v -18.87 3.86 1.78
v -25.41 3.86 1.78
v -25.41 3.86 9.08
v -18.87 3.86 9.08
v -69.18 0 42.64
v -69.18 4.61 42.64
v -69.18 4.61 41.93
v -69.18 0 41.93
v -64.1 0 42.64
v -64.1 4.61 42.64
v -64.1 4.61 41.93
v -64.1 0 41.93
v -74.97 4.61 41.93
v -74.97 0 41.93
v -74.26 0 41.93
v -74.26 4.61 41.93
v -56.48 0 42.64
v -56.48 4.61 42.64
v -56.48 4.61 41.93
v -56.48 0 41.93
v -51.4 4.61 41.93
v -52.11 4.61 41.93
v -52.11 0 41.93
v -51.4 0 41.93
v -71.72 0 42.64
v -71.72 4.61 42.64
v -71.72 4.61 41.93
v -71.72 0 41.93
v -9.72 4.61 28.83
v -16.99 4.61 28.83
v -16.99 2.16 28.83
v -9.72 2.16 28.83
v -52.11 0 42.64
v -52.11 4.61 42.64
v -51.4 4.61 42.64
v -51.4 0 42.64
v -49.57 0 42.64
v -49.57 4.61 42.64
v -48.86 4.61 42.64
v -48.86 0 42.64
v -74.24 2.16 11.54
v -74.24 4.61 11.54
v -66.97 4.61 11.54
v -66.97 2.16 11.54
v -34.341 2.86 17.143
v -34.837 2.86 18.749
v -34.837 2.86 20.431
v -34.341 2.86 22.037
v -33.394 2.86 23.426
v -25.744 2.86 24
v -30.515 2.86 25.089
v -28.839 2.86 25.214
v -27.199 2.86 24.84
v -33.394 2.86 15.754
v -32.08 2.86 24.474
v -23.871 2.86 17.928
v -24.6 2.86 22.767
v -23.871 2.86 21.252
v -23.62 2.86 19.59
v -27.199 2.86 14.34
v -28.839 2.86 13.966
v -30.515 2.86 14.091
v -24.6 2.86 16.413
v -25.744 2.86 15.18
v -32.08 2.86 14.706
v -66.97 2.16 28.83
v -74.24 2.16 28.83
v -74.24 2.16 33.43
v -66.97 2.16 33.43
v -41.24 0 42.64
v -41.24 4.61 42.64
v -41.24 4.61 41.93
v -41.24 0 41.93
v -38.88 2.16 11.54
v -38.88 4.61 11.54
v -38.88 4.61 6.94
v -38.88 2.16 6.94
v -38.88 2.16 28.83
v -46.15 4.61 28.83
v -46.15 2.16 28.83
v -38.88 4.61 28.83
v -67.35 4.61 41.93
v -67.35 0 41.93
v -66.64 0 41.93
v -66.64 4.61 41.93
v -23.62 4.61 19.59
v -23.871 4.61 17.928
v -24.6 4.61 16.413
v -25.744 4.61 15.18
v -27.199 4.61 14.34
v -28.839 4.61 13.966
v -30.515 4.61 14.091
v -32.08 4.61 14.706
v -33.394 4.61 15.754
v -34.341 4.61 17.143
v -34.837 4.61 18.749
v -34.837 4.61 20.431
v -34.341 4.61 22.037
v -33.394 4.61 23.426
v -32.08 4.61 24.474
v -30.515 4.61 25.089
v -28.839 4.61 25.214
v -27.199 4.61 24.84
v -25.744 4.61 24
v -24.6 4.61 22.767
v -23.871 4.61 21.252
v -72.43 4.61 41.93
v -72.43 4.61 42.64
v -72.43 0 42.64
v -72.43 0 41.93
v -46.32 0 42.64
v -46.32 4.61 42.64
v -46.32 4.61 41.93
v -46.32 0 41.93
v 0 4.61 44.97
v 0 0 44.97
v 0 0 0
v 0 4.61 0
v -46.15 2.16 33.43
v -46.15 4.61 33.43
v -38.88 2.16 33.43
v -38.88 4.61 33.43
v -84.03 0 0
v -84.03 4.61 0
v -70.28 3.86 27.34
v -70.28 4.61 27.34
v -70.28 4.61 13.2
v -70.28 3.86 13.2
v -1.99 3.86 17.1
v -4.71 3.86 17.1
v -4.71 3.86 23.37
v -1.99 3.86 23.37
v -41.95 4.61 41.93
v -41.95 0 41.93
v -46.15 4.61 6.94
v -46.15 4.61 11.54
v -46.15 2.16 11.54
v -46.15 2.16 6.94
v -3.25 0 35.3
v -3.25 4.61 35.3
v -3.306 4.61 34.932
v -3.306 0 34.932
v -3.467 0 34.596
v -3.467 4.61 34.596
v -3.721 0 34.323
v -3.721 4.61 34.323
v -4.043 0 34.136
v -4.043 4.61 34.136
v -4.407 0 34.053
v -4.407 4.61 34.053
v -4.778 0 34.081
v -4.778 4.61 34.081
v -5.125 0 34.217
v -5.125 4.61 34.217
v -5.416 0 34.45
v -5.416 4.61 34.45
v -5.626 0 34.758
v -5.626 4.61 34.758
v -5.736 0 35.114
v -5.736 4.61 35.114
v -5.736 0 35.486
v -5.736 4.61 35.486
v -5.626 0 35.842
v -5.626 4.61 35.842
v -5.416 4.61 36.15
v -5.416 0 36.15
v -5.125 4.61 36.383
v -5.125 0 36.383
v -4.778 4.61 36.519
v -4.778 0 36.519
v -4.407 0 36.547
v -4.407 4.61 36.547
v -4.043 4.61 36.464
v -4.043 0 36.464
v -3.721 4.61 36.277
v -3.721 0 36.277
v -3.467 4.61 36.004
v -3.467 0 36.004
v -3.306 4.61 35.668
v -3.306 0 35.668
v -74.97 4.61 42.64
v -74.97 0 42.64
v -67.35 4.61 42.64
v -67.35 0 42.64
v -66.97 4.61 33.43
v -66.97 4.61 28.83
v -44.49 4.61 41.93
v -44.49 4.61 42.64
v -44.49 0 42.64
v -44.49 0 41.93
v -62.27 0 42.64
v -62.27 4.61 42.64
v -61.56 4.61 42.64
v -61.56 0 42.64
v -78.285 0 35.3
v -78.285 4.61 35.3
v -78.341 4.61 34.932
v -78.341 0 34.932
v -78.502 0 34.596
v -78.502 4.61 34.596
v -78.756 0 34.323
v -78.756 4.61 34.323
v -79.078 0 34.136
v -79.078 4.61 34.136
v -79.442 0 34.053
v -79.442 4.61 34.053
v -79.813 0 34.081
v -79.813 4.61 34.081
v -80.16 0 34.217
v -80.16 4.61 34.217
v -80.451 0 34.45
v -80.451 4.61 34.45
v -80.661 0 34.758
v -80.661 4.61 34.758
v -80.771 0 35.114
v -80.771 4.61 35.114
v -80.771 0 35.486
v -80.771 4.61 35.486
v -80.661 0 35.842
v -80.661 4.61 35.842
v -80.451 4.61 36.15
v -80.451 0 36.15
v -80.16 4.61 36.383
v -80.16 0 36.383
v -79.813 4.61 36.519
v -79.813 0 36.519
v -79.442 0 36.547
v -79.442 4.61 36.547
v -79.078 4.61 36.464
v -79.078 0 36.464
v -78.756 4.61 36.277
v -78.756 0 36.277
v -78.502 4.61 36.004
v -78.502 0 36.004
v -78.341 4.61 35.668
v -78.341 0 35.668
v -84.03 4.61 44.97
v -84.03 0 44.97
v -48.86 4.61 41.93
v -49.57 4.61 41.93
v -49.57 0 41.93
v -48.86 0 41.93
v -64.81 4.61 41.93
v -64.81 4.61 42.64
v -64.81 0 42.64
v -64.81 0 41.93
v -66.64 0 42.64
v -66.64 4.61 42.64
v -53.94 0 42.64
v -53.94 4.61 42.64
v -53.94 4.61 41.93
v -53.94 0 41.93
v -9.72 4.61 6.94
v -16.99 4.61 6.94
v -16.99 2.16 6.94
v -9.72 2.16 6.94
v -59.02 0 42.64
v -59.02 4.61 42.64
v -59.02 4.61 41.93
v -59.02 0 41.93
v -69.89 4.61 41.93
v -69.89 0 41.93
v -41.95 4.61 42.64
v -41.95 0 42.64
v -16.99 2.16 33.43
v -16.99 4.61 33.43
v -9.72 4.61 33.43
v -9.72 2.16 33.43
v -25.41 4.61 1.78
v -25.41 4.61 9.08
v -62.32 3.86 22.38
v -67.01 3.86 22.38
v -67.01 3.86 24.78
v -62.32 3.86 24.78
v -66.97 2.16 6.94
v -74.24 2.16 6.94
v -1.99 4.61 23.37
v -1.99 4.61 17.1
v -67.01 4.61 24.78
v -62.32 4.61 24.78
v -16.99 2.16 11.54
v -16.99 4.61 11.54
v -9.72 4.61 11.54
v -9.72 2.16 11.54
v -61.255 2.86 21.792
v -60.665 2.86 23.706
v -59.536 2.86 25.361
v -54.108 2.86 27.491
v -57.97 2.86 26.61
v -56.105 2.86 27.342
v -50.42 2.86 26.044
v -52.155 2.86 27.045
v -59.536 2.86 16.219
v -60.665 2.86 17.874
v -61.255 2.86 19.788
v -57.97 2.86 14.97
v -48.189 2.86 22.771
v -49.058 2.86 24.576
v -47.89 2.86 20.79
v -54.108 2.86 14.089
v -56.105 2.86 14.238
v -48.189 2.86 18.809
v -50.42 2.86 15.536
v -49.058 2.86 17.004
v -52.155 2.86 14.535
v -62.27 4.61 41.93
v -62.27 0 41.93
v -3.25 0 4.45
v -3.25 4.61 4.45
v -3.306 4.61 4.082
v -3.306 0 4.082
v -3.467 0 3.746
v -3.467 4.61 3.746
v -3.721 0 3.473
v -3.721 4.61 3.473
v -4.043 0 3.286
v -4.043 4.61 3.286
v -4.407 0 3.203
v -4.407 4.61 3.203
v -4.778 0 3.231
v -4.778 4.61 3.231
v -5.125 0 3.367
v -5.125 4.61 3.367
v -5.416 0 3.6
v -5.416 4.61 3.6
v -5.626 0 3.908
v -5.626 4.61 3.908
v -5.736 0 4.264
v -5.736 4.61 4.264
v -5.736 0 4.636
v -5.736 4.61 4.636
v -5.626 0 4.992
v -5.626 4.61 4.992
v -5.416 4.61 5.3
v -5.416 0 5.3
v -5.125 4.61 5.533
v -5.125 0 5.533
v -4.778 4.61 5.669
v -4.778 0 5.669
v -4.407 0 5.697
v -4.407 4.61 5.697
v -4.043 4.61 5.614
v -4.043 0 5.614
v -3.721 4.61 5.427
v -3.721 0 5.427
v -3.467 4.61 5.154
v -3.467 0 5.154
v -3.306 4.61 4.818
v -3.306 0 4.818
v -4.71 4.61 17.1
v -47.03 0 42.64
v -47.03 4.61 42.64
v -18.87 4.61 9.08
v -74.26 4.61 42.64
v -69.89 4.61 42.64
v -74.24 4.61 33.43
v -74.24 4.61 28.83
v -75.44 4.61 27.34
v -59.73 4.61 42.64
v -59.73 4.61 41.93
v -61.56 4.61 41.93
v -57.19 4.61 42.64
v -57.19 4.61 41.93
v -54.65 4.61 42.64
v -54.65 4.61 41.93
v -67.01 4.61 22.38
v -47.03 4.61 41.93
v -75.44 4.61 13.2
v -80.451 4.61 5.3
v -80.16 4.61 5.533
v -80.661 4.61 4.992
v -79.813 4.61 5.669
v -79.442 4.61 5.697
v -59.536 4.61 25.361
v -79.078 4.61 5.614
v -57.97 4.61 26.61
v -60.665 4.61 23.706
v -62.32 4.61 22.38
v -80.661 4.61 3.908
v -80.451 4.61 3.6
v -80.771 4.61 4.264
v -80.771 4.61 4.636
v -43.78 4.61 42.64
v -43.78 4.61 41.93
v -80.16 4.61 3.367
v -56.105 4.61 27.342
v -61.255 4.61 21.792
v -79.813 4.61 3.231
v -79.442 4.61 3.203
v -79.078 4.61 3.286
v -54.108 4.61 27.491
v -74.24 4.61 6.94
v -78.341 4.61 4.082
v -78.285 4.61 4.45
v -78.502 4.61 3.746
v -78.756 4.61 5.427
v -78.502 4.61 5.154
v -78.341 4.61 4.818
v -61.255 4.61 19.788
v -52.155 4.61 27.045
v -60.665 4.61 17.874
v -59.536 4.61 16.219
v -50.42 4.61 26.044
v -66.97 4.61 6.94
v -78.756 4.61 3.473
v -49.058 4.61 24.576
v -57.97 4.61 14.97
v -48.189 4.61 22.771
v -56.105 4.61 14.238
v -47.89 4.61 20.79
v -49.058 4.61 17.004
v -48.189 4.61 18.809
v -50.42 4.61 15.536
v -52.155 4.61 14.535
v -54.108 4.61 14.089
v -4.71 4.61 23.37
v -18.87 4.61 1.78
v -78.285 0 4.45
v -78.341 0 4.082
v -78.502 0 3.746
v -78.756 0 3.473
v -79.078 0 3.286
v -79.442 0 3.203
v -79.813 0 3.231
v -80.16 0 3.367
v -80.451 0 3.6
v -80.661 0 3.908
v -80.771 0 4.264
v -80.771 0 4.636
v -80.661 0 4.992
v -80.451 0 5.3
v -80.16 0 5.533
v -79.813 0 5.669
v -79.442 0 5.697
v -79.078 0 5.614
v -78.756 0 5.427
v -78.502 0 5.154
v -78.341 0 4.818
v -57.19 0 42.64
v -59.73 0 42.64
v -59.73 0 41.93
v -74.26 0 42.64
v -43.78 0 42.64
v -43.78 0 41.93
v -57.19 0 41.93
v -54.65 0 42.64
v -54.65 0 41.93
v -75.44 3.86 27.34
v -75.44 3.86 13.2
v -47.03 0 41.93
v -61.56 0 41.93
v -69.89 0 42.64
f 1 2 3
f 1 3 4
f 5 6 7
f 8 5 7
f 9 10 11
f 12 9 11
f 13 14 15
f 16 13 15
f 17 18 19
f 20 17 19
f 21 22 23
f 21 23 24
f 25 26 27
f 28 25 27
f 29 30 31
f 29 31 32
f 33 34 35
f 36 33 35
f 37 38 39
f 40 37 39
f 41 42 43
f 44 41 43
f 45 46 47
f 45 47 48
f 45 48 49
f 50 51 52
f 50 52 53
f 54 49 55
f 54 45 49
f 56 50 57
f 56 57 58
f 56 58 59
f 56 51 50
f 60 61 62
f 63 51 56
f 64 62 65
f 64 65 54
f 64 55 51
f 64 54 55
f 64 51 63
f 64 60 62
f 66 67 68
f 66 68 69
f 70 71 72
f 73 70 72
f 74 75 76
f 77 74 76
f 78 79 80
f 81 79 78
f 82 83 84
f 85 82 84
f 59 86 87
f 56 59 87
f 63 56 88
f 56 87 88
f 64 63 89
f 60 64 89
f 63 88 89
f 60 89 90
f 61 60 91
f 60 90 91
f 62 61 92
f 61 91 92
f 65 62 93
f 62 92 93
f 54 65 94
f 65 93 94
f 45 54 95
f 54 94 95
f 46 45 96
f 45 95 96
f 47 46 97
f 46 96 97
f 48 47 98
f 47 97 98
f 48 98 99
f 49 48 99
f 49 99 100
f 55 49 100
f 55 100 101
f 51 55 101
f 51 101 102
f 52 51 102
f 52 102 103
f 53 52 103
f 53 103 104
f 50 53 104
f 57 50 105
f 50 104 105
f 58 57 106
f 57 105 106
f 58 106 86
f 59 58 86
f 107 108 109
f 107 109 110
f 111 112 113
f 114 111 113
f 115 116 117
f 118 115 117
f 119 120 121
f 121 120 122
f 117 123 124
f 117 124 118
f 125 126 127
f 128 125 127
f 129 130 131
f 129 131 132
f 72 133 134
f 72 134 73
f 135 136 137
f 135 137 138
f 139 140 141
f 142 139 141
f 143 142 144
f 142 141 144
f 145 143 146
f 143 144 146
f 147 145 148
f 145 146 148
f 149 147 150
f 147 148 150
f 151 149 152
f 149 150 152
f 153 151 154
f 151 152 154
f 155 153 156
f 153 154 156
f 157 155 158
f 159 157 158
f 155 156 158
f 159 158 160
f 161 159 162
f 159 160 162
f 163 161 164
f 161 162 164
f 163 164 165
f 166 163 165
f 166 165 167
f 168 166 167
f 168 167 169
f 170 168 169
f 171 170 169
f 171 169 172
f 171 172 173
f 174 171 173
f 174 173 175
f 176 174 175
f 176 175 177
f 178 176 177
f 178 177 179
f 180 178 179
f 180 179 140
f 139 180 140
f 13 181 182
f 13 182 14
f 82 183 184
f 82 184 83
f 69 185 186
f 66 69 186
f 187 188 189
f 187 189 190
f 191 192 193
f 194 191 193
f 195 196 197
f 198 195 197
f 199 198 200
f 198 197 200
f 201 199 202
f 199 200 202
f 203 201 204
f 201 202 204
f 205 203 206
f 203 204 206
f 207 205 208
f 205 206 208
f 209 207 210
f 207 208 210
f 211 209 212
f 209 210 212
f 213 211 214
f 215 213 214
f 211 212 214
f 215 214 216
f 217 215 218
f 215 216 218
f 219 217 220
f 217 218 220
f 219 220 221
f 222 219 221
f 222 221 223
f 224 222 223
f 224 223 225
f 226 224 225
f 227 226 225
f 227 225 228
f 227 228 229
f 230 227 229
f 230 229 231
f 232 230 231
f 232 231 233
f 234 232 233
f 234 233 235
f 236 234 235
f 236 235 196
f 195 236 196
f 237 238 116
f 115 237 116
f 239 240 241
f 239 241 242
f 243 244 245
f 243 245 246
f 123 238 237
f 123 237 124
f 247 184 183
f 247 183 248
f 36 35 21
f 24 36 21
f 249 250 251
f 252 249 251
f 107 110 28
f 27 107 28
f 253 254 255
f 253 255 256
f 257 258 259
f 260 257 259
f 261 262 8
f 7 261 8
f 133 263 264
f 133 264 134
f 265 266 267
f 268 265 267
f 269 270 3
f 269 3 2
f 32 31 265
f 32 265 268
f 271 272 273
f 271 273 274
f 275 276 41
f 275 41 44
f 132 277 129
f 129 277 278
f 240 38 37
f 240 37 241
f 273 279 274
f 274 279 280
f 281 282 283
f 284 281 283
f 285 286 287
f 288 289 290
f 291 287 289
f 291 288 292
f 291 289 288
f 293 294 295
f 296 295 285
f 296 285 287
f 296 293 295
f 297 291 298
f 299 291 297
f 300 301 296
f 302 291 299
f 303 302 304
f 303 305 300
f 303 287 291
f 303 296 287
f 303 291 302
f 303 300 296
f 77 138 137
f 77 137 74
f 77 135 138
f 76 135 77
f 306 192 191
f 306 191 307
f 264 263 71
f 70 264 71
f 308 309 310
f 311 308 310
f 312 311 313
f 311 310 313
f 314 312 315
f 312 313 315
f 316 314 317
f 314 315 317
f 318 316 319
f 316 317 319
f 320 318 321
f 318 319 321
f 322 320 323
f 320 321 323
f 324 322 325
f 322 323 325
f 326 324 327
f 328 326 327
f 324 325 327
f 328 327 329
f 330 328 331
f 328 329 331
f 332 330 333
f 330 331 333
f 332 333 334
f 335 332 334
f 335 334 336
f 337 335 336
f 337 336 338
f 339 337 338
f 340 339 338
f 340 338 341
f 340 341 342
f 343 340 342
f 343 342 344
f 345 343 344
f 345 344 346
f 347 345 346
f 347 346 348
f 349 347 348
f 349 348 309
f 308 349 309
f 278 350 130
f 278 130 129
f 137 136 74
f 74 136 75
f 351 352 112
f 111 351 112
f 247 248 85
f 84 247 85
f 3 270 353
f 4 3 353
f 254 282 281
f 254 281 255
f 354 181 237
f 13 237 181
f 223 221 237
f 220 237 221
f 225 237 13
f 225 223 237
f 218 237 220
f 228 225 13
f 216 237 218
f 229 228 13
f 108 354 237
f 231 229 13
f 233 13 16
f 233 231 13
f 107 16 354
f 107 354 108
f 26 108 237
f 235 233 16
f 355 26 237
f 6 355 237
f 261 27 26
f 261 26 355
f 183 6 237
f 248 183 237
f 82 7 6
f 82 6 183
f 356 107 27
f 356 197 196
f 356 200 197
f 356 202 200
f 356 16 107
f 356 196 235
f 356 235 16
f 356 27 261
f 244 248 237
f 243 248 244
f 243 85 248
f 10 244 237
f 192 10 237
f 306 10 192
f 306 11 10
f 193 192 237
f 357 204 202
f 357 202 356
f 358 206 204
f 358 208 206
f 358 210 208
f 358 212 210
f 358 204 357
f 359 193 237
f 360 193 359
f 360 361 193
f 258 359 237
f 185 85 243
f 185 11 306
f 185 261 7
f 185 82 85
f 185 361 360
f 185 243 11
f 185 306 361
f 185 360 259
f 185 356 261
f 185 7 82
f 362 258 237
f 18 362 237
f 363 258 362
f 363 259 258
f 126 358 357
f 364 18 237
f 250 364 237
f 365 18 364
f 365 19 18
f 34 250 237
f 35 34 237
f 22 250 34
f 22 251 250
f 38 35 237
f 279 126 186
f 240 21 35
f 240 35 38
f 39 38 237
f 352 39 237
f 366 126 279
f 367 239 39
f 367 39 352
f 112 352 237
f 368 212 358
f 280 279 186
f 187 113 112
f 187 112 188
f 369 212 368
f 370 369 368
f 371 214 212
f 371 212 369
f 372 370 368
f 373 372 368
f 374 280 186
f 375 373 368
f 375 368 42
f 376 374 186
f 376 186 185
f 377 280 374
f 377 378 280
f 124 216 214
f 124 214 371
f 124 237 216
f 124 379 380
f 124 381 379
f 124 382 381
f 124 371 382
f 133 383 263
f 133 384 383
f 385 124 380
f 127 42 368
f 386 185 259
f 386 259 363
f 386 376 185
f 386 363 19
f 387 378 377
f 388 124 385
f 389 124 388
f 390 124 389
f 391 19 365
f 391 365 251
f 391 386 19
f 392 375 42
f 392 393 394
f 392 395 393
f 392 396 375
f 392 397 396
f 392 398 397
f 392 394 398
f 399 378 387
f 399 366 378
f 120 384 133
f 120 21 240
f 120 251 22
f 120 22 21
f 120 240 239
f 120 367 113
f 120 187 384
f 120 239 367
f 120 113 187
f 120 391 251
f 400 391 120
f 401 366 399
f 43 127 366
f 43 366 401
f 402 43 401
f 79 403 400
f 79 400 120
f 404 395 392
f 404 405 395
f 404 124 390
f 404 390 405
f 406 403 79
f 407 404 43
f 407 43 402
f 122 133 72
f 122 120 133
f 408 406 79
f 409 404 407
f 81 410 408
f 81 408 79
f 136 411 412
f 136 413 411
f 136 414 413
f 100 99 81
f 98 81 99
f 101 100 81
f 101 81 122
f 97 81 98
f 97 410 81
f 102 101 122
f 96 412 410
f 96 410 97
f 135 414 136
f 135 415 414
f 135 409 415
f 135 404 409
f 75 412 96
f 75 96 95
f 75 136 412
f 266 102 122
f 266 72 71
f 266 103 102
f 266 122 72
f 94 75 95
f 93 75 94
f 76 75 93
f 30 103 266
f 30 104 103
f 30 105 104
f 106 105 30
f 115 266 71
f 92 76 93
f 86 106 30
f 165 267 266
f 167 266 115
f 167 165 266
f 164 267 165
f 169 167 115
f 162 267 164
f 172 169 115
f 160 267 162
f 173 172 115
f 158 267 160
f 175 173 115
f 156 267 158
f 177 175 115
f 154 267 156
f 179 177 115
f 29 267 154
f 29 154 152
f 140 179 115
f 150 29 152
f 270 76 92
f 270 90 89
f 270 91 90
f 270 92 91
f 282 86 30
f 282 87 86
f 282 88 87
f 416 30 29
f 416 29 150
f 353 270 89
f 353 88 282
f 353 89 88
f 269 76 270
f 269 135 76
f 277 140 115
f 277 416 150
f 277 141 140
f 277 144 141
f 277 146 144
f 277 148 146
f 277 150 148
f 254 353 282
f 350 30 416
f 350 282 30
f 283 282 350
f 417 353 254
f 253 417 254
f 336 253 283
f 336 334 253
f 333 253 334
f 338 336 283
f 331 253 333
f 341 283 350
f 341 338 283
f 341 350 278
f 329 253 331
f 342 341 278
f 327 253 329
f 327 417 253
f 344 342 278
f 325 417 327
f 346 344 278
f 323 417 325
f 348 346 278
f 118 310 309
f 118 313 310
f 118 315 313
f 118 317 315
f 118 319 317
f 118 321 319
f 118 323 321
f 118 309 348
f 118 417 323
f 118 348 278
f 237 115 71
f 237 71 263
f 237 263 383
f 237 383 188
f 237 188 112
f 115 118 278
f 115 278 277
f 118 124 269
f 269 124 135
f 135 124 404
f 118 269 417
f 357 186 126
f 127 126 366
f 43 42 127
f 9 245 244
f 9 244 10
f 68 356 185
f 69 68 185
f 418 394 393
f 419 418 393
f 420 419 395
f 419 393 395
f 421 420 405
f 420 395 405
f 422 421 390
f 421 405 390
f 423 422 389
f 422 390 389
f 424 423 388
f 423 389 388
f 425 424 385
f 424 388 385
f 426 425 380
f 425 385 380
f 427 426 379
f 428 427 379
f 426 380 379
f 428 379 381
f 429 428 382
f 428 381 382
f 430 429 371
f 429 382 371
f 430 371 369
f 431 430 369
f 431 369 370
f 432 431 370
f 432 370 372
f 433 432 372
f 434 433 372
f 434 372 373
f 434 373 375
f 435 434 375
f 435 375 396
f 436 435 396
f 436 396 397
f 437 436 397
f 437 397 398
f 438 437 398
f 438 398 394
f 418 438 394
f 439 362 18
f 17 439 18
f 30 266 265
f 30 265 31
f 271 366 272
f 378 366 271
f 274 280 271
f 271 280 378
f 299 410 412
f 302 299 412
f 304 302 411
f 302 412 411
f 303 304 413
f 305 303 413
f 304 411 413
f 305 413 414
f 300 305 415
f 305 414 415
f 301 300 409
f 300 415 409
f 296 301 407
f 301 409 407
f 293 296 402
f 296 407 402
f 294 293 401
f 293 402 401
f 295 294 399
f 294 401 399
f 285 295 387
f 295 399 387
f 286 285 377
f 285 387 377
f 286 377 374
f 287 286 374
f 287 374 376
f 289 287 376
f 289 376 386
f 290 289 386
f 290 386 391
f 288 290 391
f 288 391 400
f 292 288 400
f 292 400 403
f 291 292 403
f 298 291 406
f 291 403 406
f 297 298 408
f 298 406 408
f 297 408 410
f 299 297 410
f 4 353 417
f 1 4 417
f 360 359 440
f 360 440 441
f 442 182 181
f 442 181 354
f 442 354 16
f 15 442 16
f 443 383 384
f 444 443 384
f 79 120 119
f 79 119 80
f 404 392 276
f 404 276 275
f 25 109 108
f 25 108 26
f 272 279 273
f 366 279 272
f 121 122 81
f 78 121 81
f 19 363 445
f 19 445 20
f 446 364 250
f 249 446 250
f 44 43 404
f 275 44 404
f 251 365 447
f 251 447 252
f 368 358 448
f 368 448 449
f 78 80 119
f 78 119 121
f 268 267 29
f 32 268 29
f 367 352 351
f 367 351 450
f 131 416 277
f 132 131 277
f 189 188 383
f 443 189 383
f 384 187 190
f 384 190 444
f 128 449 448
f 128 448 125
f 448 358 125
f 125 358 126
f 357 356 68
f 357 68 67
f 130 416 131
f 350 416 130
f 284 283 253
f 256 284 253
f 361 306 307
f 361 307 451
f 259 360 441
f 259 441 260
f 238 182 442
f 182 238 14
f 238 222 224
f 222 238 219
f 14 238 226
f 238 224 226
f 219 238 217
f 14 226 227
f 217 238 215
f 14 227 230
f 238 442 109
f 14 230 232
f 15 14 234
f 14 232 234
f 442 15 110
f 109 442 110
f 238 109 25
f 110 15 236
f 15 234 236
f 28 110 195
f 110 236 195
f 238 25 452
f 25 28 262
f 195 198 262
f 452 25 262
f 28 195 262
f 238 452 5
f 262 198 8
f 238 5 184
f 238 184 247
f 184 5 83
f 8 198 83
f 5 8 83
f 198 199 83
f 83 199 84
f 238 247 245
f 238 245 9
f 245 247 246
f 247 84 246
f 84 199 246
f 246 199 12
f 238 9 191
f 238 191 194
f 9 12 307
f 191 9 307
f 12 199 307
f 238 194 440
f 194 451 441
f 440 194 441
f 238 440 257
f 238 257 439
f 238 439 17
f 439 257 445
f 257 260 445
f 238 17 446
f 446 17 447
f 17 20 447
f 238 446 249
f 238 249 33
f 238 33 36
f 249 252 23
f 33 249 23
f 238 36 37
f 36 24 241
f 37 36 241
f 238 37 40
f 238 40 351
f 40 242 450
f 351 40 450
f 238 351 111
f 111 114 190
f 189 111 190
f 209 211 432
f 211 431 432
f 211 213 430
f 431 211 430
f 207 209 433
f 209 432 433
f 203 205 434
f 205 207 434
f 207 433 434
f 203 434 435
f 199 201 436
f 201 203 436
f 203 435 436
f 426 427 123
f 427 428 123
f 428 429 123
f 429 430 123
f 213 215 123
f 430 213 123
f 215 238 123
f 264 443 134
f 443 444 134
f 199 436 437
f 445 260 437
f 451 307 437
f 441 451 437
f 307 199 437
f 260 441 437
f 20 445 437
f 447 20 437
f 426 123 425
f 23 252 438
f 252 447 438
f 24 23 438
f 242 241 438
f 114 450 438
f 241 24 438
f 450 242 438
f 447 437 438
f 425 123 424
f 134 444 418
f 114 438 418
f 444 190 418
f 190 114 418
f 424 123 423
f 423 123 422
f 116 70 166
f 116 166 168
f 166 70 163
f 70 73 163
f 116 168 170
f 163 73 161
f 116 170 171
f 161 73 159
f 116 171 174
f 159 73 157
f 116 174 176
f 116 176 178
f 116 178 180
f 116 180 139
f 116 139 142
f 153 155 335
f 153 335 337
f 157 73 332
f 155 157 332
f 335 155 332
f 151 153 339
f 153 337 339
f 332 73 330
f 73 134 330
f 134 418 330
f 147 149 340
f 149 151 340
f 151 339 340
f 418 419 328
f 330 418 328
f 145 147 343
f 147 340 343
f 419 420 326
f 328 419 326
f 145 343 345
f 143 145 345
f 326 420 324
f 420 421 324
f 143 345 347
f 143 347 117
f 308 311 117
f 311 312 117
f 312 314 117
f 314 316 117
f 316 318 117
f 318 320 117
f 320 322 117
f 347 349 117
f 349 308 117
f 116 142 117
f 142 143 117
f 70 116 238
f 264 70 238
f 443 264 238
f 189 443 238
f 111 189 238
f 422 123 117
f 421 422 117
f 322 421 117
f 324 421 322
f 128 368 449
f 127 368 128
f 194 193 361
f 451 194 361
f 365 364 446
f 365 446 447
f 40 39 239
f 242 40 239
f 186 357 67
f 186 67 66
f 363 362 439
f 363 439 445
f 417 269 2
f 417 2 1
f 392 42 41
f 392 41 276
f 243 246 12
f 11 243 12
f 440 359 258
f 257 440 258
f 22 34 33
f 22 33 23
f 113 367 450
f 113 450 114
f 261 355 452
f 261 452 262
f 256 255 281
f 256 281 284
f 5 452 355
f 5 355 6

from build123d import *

# Parameters (mm, degrees)
SKETCH1_W           = 84.03
SKETCH1_H           = 44.97
SKETCH1_W_2         = 0.71
SKETCH1_H_2         = 0.71
BOSS_EXTRUDE1_DEPTH = 4.61
CUT_EXTRUDE1_REACH  = 97.418
SKETCH2_R           = 1.25
SKETCH2_3_W         = 7.27
SKETCH2_3_H         = 4.6
CUT_EXTRUDE2_DEPTH  = 2.45
SKETCH2_4_R         = 6.72
SKETCH2_4_R_2       = 5.64
CUT_EXTRUDE3_DEPTH  = 1.75
SKETCH2_5_W         = 6.54
SKETCH2_5_H         = 7.3
SKETCH2_5_W_2       = 2.72
SKETCH2_5_H_2       = 6.27
SKETCH2_5_W_3       = 5.16
SKETCH2_5_H_3       = 14.14
SKETCH2_5_W_4       = 4.69
SKETCH2_5_H_4       = 2.4
CUT_EXTRUDE4_DEPTH  = 0.75


with BuildPart() as part:
    # Sketch1 → Boss-Extrude1 (new body)
    with BuildSketch(Plane(origin=(0, 0, 0), x_dir=(1, 0, 0), z_dir=(0, 1, 0))):
        with Locations((-42.015, -22.485)):
            Rectangle(SKETCH1_W, SKETCH1_H)
        with Locations((-74.615, -42.285)):
            Rectangle(SKETCH1_W_2, SKETCH1_H_2, mode=Mode.SUBTRACT)
        with Locations((-72.075, -42.285)):
            Rectangle(SKETCH1_W_2, SKETCH1_H_2, mode=Mode.SUBTRACT)
        with Locations((-69.535, -42.285)):
            Rectangle(SKETCH1_W_2, SKETCH1_H_2, mode=Mode.SUBTRACT)
        with Locations((-66.995, -42.285)):
            Rectangle(SKETCH1_W_2, SKETCH1_H_2, mode=Mode.SUBTRACT)
        with Locations((-64.455, -42.285)):
            Rectangle(SKETCH1_W_2, SKETCH1_H_2, mode=Mode.SUBTRACT)
        with Locations((-61.915, -42.285)):
            Rectangle(SKETCH1_W_2, SKETCH1_H_2, mode=Mode.SUBTRACT)
        with Locations((-59.375, -42.285)):
            Rectangle(SKETCH1_W_2, SKETCH1_H_2, mode=Mode.SUBTRACT)
        with Locations((-56.835, -42.285)):
            Rectangle(SKETCH1_W_2, SKETCH1_H_2, mode=Mode.SUBTRACT)
        with Locations((-54.295, -42.285)):
            Rectangle(SKETCH1_W_2, SKETCH1_H_2, mode=Mode.SUBTRACT)
        with Locations((-51.755, -42.285)):
            Rectangle(SKETCH1_W_2, SKETCH1_H_2, mode=Mode.SUBTRACT)
        with Locations((-49.215, -42.285)):
            Rectangle(SKETCH1_W_2, SKETCH1_H_2, mode=Mode.SUBTRACT)
        with Locations((-46.675, -42.285)):
            Rectangle(SKETCH1_W_2, SKETCH1_H_2, mode=Mode.SUBTRACT)
        with Locations((-44.135, -42.285)):
            Rectangle(SKETCH1_W_2, SKETCH1_H_2, mode=Mode.SUBTRACT)
        with Locations((-41.595, -42.285)):
            Rectangle(SKETCH1_W_2, SKETCH1_H_2, mode=Mode.SUBTRACT)
    extrude(amount=BOSS_EXTRUDE1_DEPTH)

    # Sketch2 → Cut-Extrude1 (cut, up to next)
    with BuildSketch(Plane(origin=(0, 4.61, 0), x_dir=(1, 0, 0), z_dir=(0, 1, 0)), mode=Mode.PRIVATE) as cut_extrude1_sk1:
        with Locations((-79.535, -4.45)):
            Circle(SKETCH2_R)
    cut_extrude1_tool1 = extrude(cut_extrude1_sk1.sketch, amount=-CUT_EXTRUDE1_REACH, mode=Mode.PRIVATE) & part.part
    # Sketch2 → Cut-Extrude1 (cut, up to next)
    with BuildSketch(Plane(origin=(0, 4.61, 0), x_dir=(1, 0, 0), z_dir=(0, 1, 0)), mode=Mode.PRIVATE) as cut_extrude1_sk2:
        with Locations((-79.535, -35.3)):
            Circle(SKETCH2_R)
    cut_extrude1_tool2 = extrude(cut_extrude1_sk2.sketch, amount=-CUT_EXTRUDE1_REACH, mode=Mode.PRIVATE) & part.part
    # Sketch2 → Cut-Extrude1 (cut, up to next)
    with BuildSketch(Plane(origin=(0, 4.61, 0), x_dir=(1, 0, 0), z_dir=(0, 1, 0)), mode=Mode.PRIVATE) as cut_extrude1_sk3:
        with Locations((-4.5, -4.45)):
            Circle(SKETCH2_R)
    cut_extrude1_tool3 = extrude(cut_extrude1_sk3.sketch, amount=-CUT_EXTRUDE1_REACH, mode=Mode.PRIVATE) & part.part
    # Sketch2 → Cut-Extrude1 (cut, up to next)
    with BuildSketch(Plane(origin=(0, 4.61, 0), x_dir=(1, 0, 0), z_dir=(0, 1, 0)), mode=Mode.PRIVATE) as cut_extrude1_sk4:
        with Locations((-4.5, -35.3)):
            Circle(SKETCH2_R)
    cut_extrude1_tool4 = extrude(cut_extrude1_sk4.sketch, amount=-CUT_EXTRUDE1_REACH, mode=Mode.PRIVATE) & part.part
    add(cut_extrude1_tool1.solids().sort_by_distance((-79.535, 4.61, 4.45))[0], mode=Mode.SUBTRACT)
    add(cut_extrude1_tool2.solids().sort_by_distance((-79.535, 4.61, 35.3))[0], mode=Mode.SUBTRACT)
    add(cut_extrude1_tool3.solids().sort_by_distance((-4.5, 4.61, 4.45))[0], mode=Mode.SUBTRACT)
    add(cut_extrude1_tool4.solids().sort_by_distance((-4.5, 4.61, 35.3))[0], mode=Mode.SUBTRACT)

    # Sketch2<3> → Cut-Extrude2 (cut)
    with BuildSketch(Plane(origin=(0, 4.61, 0), x_dir=(1, 0, 0), z_dir=(0, 1, 0))):
        with Locations((-13.355, -9.24)):
            Rectangle(SKETCH2_3_W, SKETCH2_3_H)
        with Locations((-42.515, -9.24)):
            Rectangle(SKETCH2_3_W, SKETCH2_3_H)
        with Locations((-70.605, -9.24)):
            Rectangle(SKETCH2_3_W, SKETCH2_3_H)
        with Locations((-70.605, -31.13)):
            Rectangle(SKETCH2_3_W, SKETCH2_3_H)
        with Locations((-42.515, -31.13)):
            Rectangle(SKETCH2_3_W, SKETCH2_3_H)
        with Locations((-13.355, -31.13)):
            Rectangle(SKETCH2_3_W, SKETCH2_3_H)
    extrude(amount=-CUT_EXTRUDE2_DEPTH, mode=Mode.SUBTRACT)

    # Sketch2<4> → Cut-Extrude3 (cut)
    with BuildSketch(Plane(origin=(0, 4.61, 0), x_dir=(1, 0, 0), z_dir=(0, 1, 0))):
        with Locations((-54.61, -20.79)):
            Circle(SKETCH2_4_R)
        with Locations((-29.26, -19.59)):
            Circle(SKETCH2_4_R_2)
    extrude(amount=-CUT_EXTRUDE3_DEPTH, mode=Mode.SUBTRACT)

    # Sketch2<5> → Cut-Extrude4 (cut)
    with BuildSketch(Plane(origin=(0, 4.61, 0), x_dir=(1, 0, 0), z_dir=(0, 1, 0))):
        with Locations((-22.14, -5.43)):
            Rectangle(SKETCH2_5_W, SKETCH2_5_H)
        with Locations((-3.35, -20.235)):
            Rectangle(SKETCH2_5_W_2, SKETCH2_5_H_2)
        with Locations((-72.86, -20.27)):
            Rectangle(SKETCH2_5_W_3, SKETCH2_5_H_3)
        with Locations((-64.665, -23.58)):
            Rectangle(SKETCH2_5_W_4, SKETCH2_5_H_4)
    extrude(amount=-CUT_EXTRUDE4_DEPTH, mode=Mode.SUBTRACT)


solid = part.part
